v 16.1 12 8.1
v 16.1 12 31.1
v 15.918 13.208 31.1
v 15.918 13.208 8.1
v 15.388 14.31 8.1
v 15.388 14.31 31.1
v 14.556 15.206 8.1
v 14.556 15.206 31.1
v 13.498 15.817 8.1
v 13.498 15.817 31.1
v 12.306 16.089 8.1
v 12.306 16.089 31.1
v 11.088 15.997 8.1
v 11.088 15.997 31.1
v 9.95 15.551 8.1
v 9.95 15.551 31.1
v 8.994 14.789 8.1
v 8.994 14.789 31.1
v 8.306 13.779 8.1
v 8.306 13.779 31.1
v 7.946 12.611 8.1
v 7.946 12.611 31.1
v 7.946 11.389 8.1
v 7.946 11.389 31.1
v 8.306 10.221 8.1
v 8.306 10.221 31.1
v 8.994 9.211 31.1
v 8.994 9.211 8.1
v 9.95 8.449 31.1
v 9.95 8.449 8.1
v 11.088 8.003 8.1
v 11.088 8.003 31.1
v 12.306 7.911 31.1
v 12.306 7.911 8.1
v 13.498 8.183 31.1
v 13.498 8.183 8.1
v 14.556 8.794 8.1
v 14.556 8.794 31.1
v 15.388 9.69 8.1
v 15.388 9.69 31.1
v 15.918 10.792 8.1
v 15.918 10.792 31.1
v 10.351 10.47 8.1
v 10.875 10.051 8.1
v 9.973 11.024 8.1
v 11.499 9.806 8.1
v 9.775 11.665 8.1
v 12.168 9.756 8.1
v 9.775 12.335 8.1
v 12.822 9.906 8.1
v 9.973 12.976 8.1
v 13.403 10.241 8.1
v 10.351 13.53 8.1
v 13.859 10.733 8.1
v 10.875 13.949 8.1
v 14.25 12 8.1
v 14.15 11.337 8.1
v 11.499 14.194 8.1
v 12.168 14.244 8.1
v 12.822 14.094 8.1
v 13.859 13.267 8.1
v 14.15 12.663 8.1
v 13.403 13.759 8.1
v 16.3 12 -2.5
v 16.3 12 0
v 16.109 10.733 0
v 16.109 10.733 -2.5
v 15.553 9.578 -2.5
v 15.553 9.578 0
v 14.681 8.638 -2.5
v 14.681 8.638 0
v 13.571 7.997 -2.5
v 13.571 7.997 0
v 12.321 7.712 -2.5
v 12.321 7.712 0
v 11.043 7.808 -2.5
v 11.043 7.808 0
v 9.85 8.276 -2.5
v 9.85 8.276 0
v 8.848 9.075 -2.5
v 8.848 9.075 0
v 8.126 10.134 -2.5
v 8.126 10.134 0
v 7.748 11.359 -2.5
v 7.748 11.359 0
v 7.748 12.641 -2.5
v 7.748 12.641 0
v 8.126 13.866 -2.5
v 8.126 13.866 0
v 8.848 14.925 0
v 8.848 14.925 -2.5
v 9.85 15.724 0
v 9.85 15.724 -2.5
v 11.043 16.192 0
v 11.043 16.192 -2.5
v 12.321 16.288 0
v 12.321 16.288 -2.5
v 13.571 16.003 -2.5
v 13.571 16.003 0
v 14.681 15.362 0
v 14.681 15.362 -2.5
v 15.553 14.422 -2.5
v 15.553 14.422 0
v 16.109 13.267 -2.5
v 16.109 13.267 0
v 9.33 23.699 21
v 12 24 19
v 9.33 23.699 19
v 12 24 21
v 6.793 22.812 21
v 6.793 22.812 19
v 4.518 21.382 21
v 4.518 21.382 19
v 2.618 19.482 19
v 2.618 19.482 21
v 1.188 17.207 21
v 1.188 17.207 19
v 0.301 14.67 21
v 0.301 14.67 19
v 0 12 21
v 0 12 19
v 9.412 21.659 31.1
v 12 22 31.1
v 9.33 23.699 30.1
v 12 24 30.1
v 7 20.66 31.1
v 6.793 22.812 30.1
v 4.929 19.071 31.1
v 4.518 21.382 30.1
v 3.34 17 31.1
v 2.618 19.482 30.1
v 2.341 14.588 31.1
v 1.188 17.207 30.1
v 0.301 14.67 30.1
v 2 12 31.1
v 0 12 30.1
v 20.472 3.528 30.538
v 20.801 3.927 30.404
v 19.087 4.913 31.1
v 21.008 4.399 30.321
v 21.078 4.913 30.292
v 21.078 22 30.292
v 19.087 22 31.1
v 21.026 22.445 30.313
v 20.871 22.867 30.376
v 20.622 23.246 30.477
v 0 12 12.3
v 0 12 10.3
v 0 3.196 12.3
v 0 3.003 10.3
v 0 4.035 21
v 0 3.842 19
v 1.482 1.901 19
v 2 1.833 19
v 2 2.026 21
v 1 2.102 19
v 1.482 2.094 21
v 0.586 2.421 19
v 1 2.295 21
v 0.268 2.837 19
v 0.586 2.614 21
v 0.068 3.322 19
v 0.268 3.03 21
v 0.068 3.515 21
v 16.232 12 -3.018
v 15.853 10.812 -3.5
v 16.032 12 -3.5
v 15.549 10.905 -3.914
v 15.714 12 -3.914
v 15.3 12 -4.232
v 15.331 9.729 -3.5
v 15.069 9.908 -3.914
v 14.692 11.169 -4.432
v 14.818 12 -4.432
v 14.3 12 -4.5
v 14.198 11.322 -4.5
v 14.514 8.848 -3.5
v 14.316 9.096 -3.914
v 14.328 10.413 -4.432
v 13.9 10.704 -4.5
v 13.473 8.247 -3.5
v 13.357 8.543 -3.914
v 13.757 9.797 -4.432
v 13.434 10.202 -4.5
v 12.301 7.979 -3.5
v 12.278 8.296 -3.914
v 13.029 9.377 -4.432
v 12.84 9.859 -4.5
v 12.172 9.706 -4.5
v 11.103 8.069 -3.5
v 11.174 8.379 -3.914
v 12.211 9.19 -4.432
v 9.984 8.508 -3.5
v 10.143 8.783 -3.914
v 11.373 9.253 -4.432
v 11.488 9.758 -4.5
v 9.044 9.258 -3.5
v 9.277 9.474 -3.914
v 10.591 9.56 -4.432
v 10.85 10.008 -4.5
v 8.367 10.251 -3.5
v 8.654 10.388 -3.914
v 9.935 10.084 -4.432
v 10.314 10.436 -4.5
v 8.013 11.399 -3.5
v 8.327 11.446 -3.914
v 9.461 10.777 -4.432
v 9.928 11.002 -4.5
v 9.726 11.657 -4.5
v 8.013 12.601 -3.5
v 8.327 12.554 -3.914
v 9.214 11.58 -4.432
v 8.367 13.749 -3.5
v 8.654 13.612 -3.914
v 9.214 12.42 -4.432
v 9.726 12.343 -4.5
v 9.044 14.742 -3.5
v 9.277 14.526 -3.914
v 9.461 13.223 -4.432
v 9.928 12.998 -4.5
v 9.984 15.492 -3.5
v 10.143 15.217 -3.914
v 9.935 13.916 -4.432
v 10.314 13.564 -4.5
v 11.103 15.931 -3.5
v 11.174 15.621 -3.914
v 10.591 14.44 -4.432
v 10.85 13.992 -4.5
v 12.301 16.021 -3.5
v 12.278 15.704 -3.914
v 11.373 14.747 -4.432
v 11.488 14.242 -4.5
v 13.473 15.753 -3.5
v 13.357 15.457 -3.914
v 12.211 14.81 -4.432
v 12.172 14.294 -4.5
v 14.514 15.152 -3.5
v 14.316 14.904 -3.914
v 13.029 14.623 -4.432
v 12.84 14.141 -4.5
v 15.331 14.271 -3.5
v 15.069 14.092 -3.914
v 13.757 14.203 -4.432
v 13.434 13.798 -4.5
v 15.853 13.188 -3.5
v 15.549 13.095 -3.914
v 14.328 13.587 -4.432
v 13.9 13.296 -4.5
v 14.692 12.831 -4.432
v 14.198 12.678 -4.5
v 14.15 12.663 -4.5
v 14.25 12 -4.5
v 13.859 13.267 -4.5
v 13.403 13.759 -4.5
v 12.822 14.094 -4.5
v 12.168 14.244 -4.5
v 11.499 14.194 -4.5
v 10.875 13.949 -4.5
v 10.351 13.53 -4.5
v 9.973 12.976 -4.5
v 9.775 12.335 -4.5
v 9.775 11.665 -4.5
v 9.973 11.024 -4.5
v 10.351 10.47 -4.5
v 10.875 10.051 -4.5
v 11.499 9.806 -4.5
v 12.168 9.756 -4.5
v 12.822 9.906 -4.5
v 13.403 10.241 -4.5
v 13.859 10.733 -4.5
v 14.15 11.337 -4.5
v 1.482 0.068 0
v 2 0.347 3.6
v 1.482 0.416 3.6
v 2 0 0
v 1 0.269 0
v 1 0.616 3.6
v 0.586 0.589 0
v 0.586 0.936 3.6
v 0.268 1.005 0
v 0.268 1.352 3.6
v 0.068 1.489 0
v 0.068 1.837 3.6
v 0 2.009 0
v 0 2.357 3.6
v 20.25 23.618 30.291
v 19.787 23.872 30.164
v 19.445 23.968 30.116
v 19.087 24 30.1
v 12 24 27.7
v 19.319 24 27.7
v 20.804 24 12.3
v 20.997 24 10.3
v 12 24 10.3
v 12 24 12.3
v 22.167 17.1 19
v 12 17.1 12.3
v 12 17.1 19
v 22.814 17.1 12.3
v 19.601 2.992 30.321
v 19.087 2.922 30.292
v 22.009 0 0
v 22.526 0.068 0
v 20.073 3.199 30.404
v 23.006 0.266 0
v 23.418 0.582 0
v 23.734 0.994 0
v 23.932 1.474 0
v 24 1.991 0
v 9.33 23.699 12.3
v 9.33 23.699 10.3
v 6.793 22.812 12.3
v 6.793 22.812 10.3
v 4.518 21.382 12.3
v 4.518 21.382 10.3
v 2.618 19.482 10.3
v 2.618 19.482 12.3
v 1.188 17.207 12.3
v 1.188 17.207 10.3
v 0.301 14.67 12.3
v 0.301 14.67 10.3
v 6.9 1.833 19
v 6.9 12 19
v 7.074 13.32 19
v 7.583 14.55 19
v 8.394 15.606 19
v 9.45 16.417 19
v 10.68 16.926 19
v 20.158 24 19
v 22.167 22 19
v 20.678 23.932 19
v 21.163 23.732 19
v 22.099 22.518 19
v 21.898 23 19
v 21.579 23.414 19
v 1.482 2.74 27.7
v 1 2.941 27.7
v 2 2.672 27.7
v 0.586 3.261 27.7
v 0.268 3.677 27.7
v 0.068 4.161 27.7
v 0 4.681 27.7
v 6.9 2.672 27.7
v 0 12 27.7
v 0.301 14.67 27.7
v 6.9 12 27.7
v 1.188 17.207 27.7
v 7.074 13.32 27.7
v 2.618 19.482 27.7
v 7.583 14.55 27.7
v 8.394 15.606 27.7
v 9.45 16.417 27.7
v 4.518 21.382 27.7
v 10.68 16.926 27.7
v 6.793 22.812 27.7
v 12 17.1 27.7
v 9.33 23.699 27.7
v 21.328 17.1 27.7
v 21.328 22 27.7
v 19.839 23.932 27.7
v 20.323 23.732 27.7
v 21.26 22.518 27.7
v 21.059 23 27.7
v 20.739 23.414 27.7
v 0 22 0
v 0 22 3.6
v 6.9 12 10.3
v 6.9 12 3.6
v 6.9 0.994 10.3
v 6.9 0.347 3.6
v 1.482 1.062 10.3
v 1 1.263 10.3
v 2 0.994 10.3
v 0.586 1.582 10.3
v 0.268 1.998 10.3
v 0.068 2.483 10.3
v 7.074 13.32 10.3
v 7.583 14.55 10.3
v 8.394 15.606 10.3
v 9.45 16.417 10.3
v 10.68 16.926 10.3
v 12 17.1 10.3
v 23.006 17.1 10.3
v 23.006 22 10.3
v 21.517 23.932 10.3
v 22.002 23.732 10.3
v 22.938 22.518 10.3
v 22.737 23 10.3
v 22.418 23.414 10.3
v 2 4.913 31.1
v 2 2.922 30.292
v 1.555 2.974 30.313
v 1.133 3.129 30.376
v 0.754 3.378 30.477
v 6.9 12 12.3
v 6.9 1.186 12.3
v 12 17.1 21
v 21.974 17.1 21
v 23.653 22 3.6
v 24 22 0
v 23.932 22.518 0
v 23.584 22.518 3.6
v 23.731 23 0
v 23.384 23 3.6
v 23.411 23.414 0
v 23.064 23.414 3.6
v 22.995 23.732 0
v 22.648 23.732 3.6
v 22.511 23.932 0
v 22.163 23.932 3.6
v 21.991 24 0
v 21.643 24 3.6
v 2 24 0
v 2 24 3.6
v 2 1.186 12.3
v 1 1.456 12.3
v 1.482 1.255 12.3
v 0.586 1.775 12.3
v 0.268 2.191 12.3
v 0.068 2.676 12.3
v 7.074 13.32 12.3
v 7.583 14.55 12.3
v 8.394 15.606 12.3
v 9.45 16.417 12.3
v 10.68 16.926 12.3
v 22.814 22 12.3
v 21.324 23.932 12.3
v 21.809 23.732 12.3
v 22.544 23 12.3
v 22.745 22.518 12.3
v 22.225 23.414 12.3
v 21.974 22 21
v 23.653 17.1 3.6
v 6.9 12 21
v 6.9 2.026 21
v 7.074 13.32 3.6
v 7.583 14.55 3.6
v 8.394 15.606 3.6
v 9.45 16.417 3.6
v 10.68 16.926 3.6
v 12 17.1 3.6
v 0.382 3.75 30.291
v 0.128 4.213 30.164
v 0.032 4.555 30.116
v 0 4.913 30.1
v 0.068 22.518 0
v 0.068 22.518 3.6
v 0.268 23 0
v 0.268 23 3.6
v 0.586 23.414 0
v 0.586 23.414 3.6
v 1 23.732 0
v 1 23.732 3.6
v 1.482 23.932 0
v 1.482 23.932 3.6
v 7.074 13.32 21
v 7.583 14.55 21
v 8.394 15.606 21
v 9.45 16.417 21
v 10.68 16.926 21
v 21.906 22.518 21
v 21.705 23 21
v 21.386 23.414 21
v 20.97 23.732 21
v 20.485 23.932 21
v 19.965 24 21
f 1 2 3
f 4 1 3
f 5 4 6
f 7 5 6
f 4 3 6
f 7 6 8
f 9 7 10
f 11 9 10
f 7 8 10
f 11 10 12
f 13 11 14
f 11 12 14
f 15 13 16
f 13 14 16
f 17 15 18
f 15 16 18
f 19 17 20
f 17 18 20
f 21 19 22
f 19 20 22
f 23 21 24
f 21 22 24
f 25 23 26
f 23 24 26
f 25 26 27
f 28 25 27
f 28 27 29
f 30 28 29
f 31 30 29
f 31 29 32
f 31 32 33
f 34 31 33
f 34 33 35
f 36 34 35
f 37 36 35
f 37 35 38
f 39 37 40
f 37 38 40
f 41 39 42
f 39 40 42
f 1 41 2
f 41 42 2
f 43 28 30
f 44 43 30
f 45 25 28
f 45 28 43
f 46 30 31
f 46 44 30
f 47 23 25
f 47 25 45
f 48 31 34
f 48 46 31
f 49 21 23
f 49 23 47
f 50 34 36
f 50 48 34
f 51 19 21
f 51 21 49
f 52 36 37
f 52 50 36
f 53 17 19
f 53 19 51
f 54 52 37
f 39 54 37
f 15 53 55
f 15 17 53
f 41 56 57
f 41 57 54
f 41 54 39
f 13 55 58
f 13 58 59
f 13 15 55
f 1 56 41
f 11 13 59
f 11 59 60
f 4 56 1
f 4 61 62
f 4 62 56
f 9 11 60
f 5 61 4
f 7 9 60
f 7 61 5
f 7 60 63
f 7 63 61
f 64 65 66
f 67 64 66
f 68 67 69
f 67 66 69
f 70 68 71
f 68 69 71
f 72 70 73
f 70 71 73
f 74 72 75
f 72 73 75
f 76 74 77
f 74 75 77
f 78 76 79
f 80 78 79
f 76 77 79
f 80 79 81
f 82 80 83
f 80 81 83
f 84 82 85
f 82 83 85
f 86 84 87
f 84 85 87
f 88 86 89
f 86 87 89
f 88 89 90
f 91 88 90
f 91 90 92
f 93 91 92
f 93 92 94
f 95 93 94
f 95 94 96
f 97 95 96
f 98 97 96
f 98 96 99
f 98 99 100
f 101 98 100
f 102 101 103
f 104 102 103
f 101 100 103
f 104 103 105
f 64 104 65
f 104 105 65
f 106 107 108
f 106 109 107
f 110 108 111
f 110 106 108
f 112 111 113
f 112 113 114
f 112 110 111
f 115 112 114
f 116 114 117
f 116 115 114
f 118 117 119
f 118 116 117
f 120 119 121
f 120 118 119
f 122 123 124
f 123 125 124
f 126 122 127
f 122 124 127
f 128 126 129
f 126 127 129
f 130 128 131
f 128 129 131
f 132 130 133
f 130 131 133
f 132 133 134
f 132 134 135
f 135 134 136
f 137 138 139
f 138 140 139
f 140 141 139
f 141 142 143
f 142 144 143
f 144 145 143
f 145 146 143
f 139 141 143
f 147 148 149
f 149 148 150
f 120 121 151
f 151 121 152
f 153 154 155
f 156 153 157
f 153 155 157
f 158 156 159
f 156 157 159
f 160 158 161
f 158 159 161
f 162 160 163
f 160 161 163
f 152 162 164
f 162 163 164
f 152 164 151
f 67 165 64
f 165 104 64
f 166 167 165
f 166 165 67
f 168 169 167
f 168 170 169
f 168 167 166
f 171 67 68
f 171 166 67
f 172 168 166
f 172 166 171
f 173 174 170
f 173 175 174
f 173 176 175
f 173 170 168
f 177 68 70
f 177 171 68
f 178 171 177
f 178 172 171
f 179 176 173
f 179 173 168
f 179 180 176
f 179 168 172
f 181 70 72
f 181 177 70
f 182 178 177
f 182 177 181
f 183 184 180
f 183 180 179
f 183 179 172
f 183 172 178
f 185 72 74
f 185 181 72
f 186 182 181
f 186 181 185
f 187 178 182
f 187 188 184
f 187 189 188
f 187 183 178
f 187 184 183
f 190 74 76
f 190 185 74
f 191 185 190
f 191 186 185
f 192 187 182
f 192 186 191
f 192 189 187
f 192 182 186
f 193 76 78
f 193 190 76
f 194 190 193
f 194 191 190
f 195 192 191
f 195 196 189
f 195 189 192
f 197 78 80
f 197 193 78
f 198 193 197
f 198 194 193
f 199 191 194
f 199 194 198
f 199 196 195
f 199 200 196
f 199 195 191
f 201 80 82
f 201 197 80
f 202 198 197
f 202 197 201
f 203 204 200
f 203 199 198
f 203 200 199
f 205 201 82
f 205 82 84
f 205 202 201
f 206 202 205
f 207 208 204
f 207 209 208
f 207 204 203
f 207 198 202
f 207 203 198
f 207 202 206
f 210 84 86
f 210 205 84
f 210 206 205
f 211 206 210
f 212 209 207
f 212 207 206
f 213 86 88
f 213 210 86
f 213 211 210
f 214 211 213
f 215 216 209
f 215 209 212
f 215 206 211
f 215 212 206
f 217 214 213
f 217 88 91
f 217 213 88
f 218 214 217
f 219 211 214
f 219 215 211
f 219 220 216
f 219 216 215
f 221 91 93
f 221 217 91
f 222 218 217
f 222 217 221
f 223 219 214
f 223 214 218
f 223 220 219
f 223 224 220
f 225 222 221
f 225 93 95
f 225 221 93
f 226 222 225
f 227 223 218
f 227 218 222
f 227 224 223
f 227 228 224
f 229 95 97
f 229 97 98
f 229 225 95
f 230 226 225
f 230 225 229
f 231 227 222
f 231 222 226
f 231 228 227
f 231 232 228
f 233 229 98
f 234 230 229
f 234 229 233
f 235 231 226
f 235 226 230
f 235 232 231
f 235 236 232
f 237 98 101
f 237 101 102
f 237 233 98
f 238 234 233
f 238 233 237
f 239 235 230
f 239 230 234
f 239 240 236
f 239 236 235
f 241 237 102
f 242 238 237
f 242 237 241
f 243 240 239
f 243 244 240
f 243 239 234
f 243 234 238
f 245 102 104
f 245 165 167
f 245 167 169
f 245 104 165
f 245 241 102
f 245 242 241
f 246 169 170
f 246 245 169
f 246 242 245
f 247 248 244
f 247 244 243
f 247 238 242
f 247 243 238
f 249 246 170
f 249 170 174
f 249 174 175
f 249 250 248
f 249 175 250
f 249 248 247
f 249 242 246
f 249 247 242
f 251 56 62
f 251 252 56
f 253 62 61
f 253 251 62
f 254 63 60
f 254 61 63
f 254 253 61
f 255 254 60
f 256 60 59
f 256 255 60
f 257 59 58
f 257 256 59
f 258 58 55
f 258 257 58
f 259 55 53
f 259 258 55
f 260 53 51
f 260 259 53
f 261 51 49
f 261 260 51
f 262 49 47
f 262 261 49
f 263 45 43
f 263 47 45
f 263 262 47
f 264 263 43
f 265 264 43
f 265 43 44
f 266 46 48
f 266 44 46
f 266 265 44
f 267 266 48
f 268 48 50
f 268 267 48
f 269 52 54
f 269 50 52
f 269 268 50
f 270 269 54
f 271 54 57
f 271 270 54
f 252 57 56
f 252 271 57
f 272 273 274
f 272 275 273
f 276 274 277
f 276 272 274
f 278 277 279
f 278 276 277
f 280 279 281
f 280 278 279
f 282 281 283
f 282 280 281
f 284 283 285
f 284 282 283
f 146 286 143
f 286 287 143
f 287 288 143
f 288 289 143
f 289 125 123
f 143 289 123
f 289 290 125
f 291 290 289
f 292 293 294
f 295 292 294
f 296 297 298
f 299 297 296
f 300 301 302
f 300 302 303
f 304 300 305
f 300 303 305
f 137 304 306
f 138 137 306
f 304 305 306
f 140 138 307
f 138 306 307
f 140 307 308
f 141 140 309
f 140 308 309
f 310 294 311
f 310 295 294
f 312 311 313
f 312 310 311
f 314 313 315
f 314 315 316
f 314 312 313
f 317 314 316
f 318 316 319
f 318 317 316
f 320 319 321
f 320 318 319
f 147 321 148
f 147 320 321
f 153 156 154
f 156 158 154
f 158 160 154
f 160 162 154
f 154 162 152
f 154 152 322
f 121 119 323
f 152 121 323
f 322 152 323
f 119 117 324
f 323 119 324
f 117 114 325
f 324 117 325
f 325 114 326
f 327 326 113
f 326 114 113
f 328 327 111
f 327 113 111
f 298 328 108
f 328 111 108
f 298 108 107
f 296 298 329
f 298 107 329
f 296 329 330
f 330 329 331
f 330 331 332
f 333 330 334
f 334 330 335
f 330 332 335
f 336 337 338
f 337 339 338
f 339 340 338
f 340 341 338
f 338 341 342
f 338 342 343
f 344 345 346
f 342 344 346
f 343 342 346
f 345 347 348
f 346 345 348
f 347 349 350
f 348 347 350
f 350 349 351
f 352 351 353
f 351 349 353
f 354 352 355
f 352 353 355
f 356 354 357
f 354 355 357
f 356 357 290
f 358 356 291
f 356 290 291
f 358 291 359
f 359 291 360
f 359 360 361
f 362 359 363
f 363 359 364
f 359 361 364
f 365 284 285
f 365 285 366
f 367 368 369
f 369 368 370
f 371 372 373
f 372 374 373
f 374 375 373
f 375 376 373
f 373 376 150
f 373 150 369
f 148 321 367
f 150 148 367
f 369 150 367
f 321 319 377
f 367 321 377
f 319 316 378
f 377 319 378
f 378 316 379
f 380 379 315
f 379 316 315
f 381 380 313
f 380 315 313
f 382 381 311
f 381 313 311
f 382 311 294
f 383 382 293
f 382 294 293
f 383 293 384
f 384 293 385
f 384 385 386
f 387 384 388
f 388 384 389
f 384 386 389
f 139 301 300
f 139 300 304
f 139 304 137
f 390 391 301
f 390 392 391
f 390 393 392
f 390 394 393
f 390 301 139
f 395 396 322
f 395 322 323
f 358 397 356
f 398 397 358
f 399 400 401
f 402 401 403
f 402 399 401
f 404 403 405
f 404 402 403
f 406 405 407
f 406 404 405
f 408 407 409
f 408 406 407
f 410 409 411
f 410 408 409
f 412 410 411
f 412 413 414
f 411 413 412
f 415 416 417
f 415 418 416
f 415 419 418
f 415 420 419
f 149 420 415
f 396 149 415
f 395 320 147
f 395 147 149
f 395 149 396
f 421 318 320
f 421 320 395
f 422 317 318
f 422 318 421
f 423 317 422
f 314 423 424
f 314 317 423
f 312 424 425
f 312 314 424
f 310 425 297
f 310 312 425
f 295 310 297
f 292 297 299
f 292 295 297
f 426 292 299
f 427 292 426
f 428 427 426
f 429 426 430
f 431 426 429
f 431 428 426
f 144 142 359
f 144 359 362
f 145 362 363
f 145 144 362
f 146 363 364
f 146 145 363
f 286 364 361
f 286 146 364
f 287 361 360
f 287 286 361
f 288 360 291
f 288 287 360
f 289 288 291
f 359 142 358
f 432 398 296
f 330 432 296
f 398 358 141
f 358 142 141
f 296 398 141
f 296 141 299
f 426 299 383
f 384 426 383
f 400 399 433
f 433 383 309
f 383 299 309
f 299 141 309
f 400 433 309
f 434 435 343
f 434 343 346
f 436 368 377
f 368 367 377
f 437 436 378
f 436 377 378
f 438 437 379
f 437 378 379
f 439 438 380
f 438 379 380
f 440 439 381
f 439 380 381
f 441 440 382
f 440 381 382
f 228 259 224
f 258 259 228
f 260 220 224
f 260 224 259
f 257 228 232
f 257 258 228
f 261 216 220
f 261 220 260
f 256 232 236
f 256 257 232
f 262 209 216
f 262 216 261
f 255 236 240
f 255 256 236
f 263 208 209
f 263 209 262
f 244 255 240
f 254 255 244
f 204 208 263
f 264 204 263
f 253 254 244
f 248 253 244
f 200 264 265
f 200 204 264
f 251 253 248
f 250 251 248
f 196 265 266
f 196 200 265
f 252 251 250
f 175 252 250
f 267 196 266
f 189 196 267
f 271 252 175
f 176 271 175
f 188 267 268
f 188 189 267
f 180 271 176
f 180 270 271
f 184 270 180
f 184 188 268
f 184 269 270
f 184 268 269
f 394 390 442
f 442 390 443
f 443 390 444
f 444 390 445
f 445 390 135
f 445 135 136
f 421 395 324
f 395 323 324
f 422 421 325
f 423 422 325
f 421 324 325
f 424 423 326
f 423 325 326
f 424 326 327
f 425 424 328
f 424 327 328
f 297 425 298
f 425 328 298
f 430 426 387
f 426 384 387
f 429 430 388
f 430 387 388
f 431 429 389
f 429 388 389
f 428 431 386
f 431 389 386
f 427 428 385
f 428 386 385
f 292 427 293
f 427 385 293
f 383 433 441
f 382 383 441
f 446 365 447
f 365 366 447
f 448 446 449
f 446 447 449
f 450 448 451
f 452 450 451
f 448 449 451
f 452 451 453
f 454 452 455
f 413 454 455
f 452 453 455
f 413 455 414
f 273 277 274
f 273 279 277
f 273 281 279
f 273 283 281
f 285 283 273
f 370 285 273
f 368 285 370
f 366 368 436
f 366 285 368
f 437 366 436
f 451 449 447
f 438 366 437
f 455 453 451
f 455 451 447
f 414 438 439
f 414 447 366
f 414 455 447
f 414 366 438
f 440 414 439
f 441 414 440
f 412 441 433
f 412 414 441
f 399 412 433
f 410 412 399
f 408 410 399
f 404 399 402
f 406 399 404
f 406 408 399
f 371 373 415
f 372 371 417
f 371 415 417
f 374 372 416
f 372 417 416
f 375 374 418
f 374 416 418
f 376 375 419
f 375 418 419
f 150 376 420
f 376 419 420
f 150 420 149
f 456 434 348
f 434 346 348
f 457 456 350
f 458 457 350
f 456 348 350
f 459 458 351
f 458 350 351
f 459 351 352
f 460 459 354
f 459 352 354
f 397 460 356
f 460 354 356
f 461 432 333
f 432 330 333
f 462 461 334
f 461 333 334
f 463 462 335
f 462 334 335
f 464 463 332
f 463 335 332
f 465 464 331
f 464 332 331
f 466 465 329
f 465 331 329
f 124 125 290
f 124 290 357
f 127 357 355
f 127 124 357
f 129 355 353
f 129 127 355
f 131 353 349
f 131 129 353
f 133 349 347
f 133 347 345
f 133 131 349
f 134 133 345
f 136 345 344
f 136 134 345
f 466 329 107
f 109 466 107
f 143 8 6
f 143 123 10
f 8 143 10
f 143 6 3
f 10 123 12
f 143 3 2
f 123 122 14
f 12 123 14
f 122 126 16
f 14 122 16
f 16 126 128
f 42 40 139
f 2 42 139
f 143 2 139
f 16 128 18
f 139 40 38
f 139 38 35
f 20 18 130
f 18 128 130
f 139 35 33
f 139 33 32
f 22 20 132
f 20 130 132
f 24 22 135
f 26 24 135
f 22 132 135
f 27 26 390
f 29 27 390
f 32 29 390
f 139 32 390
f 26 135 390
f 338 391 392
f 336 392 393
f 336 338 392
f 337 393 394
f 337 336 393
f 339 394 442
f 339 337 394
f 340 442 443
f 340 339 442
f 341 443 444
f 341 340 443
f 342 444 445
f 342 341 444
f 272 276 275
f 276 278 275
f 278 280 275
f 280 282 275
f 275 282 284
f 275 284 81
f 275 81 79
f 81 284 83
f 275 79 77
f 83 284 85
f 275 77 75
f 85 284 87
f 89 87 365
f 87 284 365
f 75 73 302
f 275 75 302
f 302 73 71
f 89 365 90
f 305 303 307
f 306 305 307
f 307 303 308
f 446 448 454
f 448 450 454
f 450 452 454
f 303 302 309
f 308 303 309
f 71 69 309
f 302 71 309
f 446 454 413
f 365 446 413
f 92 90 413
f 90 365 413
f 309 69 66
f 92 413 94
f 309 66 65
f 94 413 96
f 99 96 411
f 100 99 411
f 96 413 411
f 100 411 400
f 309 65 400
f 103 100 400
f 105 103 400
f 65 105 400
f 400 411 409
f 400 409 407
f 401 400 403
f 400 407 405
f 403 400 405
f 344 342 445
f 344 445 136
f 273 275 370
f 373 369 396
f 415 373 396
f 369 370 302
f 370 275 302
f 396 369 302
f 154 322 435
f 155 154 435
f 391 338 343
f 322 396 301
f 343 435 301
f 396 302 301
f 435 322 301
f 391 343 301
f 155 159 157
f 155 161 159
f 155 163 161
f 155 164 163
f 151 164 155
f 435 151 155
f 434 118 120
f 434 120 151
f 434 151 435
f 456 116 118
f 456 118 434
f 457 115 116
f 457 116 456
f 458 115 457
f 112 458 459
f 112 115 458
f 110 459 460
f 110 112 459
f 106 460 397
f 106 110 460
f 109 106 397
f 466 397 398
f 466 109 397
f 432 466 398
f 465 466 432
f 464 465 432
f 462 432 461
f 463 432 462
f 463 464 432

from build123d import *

# Parameters (mm, degrees)
F0_W          = 24
F0_H          = 24
F1_DEPTH      = 3.6
F2_R          = 4.3
F2_R_2        = 2.25
F3_DEPTH      = 4.5
F4_DEPTH      = 10
F5_R          = 2.25
F6_DEPTH      = 6.7
F7_W          = 17.1
F7_H          = 17.1
F7_R          = 2.25
F8_DEPTH      = 2
F9_W          = 17.1
F9_H          = 17.1
F9_R          = 2.25
F10_DEPTH     = 6.7
F11_W         = 17.1
F11_H         = 17.1
F11_R         = 2.25
F12_DEPTH     = 2
F13_W         = 17.1
F13_H         = 17.1
F14_DEPTH     = 6.7
F15_W         = 24
F15_H         = 24
F16_DEPTH     = 3.4
F17_R         = 5.1
F18_R         = 12
F19_R         = 4.1
F20_DEPTH     = 23
F23_DEPTH     = 25
F24_DEPTH     = 25
F25_DEPTH     = 50
F26_T1_DEPTH  = 14.1796577476
F26_T3_DEPTH  = 30.9358787863
F26_T5_DEPTH  = 30.9358787863
F26_T7_DEPTH  = 14.1796577476
F26_T10_ANGLE = 90
F27_R         = 2
F28_R         = 2
F29_R         = 2


# Not quite as in the source:
# - a fillet or chamfer that OpenCascade refuses, or shapes differently, is made with other operations: its cross-section is extruded or revolved along the edge and cut away or added


with BuildPart() as f1:
    # F0 (on Top) → F1 (new body)
    with BuildSketch(Plane.XY):
        with Locations((12, 12)):
            Rectangle(F0_W, F0_H)
    extrude(amount=F1_DEPTH)

    # F2 (on face) → F3 (join)
    with BuildSketch(Plane(origin=(0, 0, 0), x_dir=(1, 0, 0), z_dir=(0, 0, -1))):
        with Locations((12, -12)):
            Circle(F2_R)
        with Locations((12, -12)):
            Circle(F2_R_2, mode=Mode.SUBTRACT)
    extrude(amount=F3_DEPTH)

    # F4 (cut): a face of the model
    f4_faces = [f1.faces().sort_by_distance(p)[0] for p in [
        (12, 12, 0),
    ]]
    extrude(f4_faces, amount=-F4_DEPTH, mode=Mode.SUBTRACT)

    # F5 (on face) → F6 (join)
    with BuildSketch(Plane.XY.offset(3.6)):
        Polygon((6.9, 0), (20, 0), (24, 0), (24, 17.1), (6.9, 17.1), align=None)
        with Locations((12, 12)):
            Circle(F5_R, mode=Mode.SUBTRACT)
    extrude(amount=F6_DEPTH)

    # F7 (on face) → F8 (join)
    with BuildSketch(Plane.XY.offset(10.3)):
        Polygon((0, 24), (0, 0), (6.9, 0), (6.9, 17.1), (24, 17.1), (24, 24), align=None)
        with Locations((15.45, 8.55)):
            Rectangle(F7_W, F7_H)
        with Locations((12, 12)):
            Circle(F7_R, mode=Mode.SUBTRACT)
    extrude(amount=F8_DEPTH)

    # F9 (on face) → F10 (join)
    with BuildSketch(Plane.XY.offset(12.3)):
        with Locations((15.45, 8.55)):
            Rectangle(F9_W, F9_H)
        with Locations((12, 12)):
            Circle(F9_R, mode=Mode.SUBTRACT)
    extrude(amount=F10_DEPTH)

    # F11 (on face) → F12 (join)
    with BuildSketch(Plane.XY.offset(19)):
        Polygon((0, 0), (6.9, 0), (6.9, 17.1), (24, 17.1), (24, 24), (0, 24), align=None)
        with Locations((15.45, 8.55)):
            Rectangle(F11_W, F11_H)
        with Locations((12, 12)):
            Circle(F11_R, mode=Mode.SUBTRACT)
    extrude(amount=F12_DEPTH)

    # F13 (on face) → F14 (join)
    with BuildSketch(Plane.XY.offset(21)):
        with Locations((15.45, 8.55)):
            Rectangle(F13_W, F13_H)
    extrude(amount=F14_DEPTH)

    # F15 (on face) → F16 (join)
    with BuildSketch(Plane.XY.offset(27.7)):
        with Locations((12, 12)):
            Rectangle(F15_W, F15_H)
    extrude(amount=F16_DEPTH)

    # F17
    f17_edges = [f1.edges().sort_by_distance(p)[0] for p in [
        (6.9, 17.1, 6.95),
        (6.9, 17.1, 15.65),
        (6.9, 17.1, 24.35),
    ]]
    fillet(f17_edges, radius=F17_R)

    # F18
    f18_edges = [f1.edges().sort_by_distance(p)[0] for p in [
        (0, 24, 11.3),
        (0, 24, 20),
        (0, 24, 29.4),
    ]]
    fillet(f18_edges, radius=F18_R)

    # F19 (on face) → F20 (cut)
    with BuildSketch(Plane.XY.offset(31.1)):
        with Locations((12, 12)):
            Circle(F19_R)
    extrude(amount=-F20_DEPTH, mode=Mode.SUBTRACT)

    # F21 (on face) → F23 (join)
    with BuildSketch(Plane.YZ.offset(24)):
        Polygon((0, 31.1), (0, 0), (3, 31.1), align=None)
    extrude(amount=F23_DEPTH)

    # F22 (on face) → F24 (cut)
    with BuildSketch(Plane.XZ):
        Polygon((21, 31.1), (24, 0), (24, 31.1), align=None)
    extrude(amount=-F24_DEPTH, mode=Mode.SUBTRACT)

    # F25 (cut): a face of the model
    f25_faces = [f1.faces().sort_by_distance(p)[0] for p in [
        (49, 1, 20.7333333333),
    ]]
    extrude(f25_faces, amount=-F25_DEPTH, mode=Mode.SUBTRACT)

    # F26: chamfer of 1 x 2 on 5 edges, made by hand

    # F26_s2 → F26_t1 (cut)
    with BuildSketch(Plane.XZ.offset(-12)):
        Polygon((2, 31.1), (0, 30.1), (0, 31.1), align=None)
    extrude(amount=F26_T1_DEPTH, mode=Mode.SUBTRACT)

    # F26_s4 → F26_t3 (cut)
    with BuildSketch(Plane.YZ.offset(-4.9679393932)):
        Polygon((2.9220612214, 30.2920346615), (4.912820546, 31.1), (3, 31.1), align=None)
    extrude(amount=F26_T3_DEPTH, mode=Mode.SUBTRACT)

    # F26_s6 → F26_t5 (cut)
    with BuildSketch(Plane.XZ.offset(-28.9679393932)):
        Polygon((21.0779387786, 30.2920346615), (19.087179454, 31.1), (21, 31.1), align=None)
    extrude(amount=F26_T5_DEPTH, mode=Mode.SUBTRACT)

    # F26_s8 → F26_t7 (cut)
    with BuildSketch(Plane.YZ.offset(12)):
        Polygon((24, 30.1), (22, 31.1), (24, 31.1), align=None)
    extrude(amount=F26_T7_DEPTH, mode=Mode.SUBTRACT)

    # F26_s9 → F26_t10 (revolve, cut)
    with BuildSketch(Plane.YZ.offset(12)):
        Polygon((22, 31.1), (24, 30.1), (24, 31.1), align=None)
    revolve(axis=Axis((12, 12, 31.1), (0, 0, 1)), revolution_arc=F26_T10_ANGLE, mode=Mode.SUBTRACT)

    # F27
    f27_edges = [f1.edges().sort_by_distance(p)[0] for p in [
        (22.538969, 1.461031, 15.146017),
    ]]
    fillet(f27_edges, radius=F27_R)

    # F28
    f28_edges = [f1.edges().sort_by_distance(p)[0] for p in [
        (0, 2.787781, 28.9),
        (0, 1.92926, 20),
        (0, 1.090032, 11.3),
        (0, 0.173633, 1.8),
        (0, 24, 1.8),
        (23.826367, 24, 1.8),
        (22.909968, 24, 11.3),
        (22.07074, 24, 20),
        (21.212219, 24, 28.9),
    ]]
    fillet(f28_edges, radius=F28_R)

    # F29
    f29_edges = [f1.edges().sort_by_distance(p)[0] for p in [
        (7.7, 12, -4.5),
    ]]
    fillet(f29_edges, radius=F29_R)


solid = f1.part
